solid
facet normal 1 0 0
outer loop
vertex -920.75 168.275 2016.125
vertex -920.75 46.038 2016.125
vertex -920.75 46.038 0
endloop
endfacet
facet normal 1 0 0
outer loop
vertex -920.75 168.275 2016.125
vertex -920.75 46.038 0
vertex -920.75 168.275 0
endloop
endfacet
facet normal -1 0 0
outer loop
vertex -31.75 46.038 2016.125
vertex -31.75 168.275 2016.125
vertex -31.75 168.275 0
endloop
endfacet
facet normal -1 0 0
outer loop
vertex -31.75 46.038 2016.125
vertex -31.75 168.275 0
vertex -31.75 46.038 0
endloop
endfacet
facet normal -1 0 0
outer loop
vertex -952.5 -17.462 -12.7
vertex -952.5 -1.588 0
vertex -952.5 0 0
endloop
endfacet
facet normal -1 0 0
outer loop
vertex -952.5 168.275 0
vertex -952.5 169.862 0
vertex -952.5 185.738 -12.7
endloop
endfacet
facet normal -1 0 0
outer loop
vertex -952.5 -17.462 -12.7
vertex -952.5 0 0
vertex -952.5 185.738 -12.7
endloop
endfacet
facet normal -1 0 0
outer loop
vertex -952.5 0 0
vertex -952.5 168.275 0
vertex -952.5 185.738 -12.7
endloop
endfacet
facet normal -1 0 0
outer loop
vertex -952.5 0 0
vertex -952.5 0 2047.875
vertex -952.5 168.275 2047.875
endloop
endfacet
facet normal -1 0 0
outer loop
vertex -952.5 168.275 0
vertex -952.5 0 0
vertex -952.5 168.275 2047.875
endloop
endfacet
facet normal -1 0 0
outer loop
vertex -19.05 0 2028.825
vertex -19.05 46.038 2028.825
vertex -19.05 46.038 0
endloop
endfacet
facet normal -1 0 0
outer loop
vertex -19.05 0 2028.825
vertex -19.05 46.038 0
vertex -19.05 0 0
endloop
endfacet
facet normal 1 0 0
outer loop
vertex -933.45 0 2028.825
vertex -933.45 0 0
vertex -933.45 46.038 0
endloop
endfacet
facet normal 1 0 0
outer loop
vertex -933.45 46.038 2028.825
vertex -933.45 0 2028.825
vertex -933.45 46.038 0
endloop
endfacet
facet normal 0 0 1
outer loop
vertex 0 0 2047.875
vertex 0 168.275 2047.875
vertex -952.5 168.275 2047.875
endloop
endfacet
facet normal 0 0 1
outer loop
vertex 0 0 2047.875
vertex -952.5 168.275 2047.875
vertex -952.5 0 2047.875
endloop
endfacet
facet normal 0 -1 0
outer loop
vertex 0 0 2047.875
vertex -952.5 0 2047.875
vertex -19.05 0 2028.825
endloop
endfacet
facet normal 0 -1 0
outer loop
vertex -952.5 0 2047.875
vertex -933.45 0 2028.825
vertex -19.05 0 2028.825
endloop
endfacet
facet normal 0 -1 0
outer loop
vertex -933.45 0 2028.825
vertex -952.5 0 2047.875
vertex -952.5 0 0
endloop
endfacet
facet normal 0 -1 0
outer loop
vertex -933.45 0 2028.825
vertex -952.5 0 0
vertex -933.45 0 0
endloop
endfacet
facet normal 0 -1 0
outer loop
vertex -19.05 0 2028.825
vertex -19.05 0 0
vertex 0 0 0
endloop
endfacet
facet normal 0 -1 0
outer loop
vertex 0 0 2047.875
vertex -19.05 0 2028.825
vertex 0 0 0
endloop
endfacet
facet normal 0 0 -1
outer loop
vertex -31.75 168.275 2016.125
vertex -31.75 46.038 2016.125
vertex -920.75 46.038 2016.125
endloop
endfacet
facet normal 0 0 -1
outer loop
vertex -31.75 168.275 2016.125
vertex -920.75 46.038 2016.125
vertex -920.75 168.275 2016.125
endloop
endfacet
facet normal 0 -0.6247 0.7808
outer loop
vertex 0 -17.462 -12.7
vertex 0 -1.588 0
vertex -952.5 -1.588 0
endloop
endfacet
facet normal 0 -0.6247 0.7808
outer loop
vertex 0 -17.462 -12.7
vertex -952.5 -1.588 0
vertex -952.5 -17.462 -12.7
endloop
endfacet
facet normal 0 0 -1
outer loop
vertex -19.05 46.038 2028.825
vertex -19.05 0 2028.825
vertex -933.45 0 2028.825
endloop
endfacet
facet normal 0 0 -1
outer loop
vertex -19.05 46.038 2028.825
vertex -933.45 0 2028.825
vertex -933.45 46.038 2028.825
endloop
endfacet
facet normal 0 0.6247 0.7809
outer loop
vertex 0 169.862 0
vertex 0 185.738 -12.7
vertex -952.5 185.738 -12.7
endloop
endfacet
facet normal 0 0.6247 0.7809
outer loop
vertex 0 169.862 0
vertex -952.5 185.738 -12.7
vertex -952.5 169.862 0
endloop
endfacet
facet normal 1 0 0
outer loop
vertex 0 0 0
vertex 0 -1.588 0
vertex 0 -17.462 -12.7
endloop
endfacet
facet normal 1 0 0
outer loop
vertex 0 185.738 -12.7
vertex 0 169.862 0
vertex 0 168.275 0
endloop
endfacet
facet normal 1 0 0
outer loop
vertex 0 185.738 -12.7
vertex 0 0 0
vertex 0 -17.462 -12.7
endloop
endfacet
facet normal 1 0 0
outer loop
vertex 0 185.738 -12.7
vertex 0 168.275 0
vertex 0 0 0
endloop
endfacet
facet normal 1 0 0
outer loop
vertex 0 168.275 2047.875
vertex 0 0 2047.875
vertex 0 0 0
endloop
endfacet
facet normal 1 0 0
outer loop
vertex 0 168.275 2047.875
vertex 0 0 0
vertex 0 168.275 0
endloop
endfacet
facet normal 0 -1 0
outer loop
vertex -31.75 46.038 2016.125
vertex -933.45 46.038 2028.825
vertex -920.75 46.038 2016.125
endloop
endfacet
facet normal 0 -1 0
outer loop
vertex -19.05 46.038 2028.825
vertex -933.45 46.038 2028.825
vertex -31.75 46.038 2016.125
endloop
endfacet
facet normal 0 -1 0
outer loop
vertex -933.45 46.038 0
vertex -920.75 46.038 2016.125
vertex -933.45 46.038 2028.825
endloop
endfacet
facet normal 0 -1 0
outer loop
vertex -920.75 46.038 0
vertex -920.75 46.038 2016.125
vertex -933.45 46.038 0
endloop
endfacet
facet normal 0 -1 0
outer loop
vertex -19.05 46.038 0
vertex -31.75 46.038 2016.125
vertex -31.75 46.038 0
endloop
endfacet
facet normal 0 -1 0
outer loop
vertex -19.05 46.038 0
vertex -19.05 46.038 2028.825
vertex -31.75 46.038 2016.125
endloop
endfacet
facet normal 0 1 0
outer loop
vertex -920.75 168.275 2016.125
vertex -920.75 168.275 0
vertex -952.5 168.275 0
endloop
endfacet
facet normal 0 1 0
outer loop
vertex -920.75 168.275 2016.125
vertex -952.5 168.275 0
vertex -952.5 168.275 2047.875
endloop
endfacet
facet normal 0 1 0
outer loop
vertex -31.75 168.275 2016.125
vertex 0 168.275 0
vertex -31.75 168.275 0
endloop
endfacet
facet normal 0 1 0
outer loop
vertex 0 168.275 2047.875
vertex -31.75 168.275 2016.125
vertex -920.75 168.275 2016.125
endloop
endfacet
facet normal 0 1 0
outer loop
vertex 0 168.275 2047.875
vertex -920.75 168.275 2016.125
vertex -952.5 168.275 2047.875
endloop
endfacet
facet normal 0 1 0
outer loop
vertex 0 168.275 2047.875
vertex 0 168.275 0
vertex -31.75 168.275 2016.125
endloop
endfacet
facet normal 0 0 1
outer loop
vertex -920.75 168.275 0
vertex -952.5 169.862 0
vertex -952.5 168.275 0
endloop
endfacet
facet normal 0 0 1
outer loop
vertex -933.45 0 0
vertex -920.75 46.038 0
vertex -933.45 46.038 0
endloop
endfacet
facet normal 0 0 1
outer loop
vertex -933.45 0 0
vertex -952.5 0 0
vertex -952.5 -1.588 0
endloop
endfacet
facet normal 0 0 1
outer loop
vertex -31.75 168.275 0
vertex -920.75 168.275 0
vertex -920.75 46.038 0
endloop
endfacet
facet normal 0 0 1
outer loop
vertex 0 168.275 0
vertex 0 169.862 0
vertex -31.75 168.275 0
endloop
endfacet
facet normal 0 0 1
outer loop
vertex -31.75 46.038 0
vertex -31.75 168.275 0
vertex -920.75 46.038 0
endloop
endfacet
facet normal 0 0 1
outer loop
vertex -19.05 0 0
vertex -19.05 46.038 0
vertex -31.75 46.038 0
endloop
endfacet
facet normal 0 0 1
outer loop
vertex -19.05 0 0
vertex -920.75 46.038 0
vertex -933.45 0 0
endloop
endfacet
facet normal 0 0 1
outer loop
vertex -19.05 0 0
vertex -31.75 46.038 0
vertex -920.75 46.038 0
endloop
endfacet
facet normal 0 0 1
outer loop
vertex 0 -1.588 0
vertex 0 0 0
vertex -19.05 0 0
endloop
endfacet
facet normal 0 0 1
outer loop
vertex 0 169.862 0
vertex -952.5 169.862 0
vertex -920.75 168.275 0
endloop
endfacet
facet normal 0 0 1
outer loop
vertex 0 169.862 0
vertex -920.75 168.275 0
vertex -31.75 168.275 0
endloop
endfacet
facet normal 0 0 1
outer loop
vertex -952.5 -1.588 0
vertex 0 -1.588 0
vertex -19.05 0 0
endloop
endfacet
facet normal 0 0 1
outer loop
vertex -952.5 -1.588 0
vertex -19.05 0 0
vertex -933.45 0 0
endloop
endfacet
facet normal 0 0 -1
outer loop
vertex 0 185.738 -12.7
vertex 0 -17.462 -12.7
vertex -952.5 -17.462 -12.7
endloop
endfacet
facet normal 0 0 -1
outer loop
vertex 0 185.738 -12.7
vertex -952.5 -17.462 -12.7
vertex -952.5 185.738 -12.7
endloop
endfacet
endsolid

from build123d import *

# Parameters (mm, degrees)
F1_DEPTH = 2047.875
F3_DEPTH = 168.276
F5_DEPTH = 952.5
F7_DEPTH = 952.5


with BuildPart() as f1:
    # F0 (on Top) → F1 (new body)
    with BuildSketch(Plane.XY):
        Polygon((-19.05, 0), (0, 0), (0, 168.275), (-31.75, 168.275), (-31.75, 46.0375), (-19.05, 46.0375), align=None)
        Polygon((-933.45, 0), (-933.45, 46.0375), (-920.75, 46.0375), (-920.75, 168.275), (-952.5, 168.275), (-952.5, 0), align=None)
    extrude(amount=F1_DEPTH)

    # F2 (on Front) → F3 (cut, through all)
    with BuildSketch(Plane.XZ):
        Polygon((0, 2047.875), (-952.5, 2047.875), (-476.25, 1571.625), align=None)
    extrude(amount=-F3_DEPTH, mode=Mode.SUBTRACT)

    # F4 (on Right) → F5 (join, through all)
    with BuildSketch(Plane.YZ):
        Polygon((46.0375, 2016.125), (168.275, 2016.125), (168.275, 2047.875), (0, 2047.875), (0, 2028.825), (46.0375, 2028.825), align=None)
    extrude(amount=-F5_DEPTH)

    # F6 (on Right) → F7 (join, through all)
    with BuildSketch(Plane.YZ):
        Polygon((-17.4625, -12.7), (84.1375, -12.7), (185.7375, -12.7), (169.8625, 0), (84.1375, 0), (-1.5875, 0), align=None)
    extrude(amount=-F7_DEPTH)


solid = f1.part
